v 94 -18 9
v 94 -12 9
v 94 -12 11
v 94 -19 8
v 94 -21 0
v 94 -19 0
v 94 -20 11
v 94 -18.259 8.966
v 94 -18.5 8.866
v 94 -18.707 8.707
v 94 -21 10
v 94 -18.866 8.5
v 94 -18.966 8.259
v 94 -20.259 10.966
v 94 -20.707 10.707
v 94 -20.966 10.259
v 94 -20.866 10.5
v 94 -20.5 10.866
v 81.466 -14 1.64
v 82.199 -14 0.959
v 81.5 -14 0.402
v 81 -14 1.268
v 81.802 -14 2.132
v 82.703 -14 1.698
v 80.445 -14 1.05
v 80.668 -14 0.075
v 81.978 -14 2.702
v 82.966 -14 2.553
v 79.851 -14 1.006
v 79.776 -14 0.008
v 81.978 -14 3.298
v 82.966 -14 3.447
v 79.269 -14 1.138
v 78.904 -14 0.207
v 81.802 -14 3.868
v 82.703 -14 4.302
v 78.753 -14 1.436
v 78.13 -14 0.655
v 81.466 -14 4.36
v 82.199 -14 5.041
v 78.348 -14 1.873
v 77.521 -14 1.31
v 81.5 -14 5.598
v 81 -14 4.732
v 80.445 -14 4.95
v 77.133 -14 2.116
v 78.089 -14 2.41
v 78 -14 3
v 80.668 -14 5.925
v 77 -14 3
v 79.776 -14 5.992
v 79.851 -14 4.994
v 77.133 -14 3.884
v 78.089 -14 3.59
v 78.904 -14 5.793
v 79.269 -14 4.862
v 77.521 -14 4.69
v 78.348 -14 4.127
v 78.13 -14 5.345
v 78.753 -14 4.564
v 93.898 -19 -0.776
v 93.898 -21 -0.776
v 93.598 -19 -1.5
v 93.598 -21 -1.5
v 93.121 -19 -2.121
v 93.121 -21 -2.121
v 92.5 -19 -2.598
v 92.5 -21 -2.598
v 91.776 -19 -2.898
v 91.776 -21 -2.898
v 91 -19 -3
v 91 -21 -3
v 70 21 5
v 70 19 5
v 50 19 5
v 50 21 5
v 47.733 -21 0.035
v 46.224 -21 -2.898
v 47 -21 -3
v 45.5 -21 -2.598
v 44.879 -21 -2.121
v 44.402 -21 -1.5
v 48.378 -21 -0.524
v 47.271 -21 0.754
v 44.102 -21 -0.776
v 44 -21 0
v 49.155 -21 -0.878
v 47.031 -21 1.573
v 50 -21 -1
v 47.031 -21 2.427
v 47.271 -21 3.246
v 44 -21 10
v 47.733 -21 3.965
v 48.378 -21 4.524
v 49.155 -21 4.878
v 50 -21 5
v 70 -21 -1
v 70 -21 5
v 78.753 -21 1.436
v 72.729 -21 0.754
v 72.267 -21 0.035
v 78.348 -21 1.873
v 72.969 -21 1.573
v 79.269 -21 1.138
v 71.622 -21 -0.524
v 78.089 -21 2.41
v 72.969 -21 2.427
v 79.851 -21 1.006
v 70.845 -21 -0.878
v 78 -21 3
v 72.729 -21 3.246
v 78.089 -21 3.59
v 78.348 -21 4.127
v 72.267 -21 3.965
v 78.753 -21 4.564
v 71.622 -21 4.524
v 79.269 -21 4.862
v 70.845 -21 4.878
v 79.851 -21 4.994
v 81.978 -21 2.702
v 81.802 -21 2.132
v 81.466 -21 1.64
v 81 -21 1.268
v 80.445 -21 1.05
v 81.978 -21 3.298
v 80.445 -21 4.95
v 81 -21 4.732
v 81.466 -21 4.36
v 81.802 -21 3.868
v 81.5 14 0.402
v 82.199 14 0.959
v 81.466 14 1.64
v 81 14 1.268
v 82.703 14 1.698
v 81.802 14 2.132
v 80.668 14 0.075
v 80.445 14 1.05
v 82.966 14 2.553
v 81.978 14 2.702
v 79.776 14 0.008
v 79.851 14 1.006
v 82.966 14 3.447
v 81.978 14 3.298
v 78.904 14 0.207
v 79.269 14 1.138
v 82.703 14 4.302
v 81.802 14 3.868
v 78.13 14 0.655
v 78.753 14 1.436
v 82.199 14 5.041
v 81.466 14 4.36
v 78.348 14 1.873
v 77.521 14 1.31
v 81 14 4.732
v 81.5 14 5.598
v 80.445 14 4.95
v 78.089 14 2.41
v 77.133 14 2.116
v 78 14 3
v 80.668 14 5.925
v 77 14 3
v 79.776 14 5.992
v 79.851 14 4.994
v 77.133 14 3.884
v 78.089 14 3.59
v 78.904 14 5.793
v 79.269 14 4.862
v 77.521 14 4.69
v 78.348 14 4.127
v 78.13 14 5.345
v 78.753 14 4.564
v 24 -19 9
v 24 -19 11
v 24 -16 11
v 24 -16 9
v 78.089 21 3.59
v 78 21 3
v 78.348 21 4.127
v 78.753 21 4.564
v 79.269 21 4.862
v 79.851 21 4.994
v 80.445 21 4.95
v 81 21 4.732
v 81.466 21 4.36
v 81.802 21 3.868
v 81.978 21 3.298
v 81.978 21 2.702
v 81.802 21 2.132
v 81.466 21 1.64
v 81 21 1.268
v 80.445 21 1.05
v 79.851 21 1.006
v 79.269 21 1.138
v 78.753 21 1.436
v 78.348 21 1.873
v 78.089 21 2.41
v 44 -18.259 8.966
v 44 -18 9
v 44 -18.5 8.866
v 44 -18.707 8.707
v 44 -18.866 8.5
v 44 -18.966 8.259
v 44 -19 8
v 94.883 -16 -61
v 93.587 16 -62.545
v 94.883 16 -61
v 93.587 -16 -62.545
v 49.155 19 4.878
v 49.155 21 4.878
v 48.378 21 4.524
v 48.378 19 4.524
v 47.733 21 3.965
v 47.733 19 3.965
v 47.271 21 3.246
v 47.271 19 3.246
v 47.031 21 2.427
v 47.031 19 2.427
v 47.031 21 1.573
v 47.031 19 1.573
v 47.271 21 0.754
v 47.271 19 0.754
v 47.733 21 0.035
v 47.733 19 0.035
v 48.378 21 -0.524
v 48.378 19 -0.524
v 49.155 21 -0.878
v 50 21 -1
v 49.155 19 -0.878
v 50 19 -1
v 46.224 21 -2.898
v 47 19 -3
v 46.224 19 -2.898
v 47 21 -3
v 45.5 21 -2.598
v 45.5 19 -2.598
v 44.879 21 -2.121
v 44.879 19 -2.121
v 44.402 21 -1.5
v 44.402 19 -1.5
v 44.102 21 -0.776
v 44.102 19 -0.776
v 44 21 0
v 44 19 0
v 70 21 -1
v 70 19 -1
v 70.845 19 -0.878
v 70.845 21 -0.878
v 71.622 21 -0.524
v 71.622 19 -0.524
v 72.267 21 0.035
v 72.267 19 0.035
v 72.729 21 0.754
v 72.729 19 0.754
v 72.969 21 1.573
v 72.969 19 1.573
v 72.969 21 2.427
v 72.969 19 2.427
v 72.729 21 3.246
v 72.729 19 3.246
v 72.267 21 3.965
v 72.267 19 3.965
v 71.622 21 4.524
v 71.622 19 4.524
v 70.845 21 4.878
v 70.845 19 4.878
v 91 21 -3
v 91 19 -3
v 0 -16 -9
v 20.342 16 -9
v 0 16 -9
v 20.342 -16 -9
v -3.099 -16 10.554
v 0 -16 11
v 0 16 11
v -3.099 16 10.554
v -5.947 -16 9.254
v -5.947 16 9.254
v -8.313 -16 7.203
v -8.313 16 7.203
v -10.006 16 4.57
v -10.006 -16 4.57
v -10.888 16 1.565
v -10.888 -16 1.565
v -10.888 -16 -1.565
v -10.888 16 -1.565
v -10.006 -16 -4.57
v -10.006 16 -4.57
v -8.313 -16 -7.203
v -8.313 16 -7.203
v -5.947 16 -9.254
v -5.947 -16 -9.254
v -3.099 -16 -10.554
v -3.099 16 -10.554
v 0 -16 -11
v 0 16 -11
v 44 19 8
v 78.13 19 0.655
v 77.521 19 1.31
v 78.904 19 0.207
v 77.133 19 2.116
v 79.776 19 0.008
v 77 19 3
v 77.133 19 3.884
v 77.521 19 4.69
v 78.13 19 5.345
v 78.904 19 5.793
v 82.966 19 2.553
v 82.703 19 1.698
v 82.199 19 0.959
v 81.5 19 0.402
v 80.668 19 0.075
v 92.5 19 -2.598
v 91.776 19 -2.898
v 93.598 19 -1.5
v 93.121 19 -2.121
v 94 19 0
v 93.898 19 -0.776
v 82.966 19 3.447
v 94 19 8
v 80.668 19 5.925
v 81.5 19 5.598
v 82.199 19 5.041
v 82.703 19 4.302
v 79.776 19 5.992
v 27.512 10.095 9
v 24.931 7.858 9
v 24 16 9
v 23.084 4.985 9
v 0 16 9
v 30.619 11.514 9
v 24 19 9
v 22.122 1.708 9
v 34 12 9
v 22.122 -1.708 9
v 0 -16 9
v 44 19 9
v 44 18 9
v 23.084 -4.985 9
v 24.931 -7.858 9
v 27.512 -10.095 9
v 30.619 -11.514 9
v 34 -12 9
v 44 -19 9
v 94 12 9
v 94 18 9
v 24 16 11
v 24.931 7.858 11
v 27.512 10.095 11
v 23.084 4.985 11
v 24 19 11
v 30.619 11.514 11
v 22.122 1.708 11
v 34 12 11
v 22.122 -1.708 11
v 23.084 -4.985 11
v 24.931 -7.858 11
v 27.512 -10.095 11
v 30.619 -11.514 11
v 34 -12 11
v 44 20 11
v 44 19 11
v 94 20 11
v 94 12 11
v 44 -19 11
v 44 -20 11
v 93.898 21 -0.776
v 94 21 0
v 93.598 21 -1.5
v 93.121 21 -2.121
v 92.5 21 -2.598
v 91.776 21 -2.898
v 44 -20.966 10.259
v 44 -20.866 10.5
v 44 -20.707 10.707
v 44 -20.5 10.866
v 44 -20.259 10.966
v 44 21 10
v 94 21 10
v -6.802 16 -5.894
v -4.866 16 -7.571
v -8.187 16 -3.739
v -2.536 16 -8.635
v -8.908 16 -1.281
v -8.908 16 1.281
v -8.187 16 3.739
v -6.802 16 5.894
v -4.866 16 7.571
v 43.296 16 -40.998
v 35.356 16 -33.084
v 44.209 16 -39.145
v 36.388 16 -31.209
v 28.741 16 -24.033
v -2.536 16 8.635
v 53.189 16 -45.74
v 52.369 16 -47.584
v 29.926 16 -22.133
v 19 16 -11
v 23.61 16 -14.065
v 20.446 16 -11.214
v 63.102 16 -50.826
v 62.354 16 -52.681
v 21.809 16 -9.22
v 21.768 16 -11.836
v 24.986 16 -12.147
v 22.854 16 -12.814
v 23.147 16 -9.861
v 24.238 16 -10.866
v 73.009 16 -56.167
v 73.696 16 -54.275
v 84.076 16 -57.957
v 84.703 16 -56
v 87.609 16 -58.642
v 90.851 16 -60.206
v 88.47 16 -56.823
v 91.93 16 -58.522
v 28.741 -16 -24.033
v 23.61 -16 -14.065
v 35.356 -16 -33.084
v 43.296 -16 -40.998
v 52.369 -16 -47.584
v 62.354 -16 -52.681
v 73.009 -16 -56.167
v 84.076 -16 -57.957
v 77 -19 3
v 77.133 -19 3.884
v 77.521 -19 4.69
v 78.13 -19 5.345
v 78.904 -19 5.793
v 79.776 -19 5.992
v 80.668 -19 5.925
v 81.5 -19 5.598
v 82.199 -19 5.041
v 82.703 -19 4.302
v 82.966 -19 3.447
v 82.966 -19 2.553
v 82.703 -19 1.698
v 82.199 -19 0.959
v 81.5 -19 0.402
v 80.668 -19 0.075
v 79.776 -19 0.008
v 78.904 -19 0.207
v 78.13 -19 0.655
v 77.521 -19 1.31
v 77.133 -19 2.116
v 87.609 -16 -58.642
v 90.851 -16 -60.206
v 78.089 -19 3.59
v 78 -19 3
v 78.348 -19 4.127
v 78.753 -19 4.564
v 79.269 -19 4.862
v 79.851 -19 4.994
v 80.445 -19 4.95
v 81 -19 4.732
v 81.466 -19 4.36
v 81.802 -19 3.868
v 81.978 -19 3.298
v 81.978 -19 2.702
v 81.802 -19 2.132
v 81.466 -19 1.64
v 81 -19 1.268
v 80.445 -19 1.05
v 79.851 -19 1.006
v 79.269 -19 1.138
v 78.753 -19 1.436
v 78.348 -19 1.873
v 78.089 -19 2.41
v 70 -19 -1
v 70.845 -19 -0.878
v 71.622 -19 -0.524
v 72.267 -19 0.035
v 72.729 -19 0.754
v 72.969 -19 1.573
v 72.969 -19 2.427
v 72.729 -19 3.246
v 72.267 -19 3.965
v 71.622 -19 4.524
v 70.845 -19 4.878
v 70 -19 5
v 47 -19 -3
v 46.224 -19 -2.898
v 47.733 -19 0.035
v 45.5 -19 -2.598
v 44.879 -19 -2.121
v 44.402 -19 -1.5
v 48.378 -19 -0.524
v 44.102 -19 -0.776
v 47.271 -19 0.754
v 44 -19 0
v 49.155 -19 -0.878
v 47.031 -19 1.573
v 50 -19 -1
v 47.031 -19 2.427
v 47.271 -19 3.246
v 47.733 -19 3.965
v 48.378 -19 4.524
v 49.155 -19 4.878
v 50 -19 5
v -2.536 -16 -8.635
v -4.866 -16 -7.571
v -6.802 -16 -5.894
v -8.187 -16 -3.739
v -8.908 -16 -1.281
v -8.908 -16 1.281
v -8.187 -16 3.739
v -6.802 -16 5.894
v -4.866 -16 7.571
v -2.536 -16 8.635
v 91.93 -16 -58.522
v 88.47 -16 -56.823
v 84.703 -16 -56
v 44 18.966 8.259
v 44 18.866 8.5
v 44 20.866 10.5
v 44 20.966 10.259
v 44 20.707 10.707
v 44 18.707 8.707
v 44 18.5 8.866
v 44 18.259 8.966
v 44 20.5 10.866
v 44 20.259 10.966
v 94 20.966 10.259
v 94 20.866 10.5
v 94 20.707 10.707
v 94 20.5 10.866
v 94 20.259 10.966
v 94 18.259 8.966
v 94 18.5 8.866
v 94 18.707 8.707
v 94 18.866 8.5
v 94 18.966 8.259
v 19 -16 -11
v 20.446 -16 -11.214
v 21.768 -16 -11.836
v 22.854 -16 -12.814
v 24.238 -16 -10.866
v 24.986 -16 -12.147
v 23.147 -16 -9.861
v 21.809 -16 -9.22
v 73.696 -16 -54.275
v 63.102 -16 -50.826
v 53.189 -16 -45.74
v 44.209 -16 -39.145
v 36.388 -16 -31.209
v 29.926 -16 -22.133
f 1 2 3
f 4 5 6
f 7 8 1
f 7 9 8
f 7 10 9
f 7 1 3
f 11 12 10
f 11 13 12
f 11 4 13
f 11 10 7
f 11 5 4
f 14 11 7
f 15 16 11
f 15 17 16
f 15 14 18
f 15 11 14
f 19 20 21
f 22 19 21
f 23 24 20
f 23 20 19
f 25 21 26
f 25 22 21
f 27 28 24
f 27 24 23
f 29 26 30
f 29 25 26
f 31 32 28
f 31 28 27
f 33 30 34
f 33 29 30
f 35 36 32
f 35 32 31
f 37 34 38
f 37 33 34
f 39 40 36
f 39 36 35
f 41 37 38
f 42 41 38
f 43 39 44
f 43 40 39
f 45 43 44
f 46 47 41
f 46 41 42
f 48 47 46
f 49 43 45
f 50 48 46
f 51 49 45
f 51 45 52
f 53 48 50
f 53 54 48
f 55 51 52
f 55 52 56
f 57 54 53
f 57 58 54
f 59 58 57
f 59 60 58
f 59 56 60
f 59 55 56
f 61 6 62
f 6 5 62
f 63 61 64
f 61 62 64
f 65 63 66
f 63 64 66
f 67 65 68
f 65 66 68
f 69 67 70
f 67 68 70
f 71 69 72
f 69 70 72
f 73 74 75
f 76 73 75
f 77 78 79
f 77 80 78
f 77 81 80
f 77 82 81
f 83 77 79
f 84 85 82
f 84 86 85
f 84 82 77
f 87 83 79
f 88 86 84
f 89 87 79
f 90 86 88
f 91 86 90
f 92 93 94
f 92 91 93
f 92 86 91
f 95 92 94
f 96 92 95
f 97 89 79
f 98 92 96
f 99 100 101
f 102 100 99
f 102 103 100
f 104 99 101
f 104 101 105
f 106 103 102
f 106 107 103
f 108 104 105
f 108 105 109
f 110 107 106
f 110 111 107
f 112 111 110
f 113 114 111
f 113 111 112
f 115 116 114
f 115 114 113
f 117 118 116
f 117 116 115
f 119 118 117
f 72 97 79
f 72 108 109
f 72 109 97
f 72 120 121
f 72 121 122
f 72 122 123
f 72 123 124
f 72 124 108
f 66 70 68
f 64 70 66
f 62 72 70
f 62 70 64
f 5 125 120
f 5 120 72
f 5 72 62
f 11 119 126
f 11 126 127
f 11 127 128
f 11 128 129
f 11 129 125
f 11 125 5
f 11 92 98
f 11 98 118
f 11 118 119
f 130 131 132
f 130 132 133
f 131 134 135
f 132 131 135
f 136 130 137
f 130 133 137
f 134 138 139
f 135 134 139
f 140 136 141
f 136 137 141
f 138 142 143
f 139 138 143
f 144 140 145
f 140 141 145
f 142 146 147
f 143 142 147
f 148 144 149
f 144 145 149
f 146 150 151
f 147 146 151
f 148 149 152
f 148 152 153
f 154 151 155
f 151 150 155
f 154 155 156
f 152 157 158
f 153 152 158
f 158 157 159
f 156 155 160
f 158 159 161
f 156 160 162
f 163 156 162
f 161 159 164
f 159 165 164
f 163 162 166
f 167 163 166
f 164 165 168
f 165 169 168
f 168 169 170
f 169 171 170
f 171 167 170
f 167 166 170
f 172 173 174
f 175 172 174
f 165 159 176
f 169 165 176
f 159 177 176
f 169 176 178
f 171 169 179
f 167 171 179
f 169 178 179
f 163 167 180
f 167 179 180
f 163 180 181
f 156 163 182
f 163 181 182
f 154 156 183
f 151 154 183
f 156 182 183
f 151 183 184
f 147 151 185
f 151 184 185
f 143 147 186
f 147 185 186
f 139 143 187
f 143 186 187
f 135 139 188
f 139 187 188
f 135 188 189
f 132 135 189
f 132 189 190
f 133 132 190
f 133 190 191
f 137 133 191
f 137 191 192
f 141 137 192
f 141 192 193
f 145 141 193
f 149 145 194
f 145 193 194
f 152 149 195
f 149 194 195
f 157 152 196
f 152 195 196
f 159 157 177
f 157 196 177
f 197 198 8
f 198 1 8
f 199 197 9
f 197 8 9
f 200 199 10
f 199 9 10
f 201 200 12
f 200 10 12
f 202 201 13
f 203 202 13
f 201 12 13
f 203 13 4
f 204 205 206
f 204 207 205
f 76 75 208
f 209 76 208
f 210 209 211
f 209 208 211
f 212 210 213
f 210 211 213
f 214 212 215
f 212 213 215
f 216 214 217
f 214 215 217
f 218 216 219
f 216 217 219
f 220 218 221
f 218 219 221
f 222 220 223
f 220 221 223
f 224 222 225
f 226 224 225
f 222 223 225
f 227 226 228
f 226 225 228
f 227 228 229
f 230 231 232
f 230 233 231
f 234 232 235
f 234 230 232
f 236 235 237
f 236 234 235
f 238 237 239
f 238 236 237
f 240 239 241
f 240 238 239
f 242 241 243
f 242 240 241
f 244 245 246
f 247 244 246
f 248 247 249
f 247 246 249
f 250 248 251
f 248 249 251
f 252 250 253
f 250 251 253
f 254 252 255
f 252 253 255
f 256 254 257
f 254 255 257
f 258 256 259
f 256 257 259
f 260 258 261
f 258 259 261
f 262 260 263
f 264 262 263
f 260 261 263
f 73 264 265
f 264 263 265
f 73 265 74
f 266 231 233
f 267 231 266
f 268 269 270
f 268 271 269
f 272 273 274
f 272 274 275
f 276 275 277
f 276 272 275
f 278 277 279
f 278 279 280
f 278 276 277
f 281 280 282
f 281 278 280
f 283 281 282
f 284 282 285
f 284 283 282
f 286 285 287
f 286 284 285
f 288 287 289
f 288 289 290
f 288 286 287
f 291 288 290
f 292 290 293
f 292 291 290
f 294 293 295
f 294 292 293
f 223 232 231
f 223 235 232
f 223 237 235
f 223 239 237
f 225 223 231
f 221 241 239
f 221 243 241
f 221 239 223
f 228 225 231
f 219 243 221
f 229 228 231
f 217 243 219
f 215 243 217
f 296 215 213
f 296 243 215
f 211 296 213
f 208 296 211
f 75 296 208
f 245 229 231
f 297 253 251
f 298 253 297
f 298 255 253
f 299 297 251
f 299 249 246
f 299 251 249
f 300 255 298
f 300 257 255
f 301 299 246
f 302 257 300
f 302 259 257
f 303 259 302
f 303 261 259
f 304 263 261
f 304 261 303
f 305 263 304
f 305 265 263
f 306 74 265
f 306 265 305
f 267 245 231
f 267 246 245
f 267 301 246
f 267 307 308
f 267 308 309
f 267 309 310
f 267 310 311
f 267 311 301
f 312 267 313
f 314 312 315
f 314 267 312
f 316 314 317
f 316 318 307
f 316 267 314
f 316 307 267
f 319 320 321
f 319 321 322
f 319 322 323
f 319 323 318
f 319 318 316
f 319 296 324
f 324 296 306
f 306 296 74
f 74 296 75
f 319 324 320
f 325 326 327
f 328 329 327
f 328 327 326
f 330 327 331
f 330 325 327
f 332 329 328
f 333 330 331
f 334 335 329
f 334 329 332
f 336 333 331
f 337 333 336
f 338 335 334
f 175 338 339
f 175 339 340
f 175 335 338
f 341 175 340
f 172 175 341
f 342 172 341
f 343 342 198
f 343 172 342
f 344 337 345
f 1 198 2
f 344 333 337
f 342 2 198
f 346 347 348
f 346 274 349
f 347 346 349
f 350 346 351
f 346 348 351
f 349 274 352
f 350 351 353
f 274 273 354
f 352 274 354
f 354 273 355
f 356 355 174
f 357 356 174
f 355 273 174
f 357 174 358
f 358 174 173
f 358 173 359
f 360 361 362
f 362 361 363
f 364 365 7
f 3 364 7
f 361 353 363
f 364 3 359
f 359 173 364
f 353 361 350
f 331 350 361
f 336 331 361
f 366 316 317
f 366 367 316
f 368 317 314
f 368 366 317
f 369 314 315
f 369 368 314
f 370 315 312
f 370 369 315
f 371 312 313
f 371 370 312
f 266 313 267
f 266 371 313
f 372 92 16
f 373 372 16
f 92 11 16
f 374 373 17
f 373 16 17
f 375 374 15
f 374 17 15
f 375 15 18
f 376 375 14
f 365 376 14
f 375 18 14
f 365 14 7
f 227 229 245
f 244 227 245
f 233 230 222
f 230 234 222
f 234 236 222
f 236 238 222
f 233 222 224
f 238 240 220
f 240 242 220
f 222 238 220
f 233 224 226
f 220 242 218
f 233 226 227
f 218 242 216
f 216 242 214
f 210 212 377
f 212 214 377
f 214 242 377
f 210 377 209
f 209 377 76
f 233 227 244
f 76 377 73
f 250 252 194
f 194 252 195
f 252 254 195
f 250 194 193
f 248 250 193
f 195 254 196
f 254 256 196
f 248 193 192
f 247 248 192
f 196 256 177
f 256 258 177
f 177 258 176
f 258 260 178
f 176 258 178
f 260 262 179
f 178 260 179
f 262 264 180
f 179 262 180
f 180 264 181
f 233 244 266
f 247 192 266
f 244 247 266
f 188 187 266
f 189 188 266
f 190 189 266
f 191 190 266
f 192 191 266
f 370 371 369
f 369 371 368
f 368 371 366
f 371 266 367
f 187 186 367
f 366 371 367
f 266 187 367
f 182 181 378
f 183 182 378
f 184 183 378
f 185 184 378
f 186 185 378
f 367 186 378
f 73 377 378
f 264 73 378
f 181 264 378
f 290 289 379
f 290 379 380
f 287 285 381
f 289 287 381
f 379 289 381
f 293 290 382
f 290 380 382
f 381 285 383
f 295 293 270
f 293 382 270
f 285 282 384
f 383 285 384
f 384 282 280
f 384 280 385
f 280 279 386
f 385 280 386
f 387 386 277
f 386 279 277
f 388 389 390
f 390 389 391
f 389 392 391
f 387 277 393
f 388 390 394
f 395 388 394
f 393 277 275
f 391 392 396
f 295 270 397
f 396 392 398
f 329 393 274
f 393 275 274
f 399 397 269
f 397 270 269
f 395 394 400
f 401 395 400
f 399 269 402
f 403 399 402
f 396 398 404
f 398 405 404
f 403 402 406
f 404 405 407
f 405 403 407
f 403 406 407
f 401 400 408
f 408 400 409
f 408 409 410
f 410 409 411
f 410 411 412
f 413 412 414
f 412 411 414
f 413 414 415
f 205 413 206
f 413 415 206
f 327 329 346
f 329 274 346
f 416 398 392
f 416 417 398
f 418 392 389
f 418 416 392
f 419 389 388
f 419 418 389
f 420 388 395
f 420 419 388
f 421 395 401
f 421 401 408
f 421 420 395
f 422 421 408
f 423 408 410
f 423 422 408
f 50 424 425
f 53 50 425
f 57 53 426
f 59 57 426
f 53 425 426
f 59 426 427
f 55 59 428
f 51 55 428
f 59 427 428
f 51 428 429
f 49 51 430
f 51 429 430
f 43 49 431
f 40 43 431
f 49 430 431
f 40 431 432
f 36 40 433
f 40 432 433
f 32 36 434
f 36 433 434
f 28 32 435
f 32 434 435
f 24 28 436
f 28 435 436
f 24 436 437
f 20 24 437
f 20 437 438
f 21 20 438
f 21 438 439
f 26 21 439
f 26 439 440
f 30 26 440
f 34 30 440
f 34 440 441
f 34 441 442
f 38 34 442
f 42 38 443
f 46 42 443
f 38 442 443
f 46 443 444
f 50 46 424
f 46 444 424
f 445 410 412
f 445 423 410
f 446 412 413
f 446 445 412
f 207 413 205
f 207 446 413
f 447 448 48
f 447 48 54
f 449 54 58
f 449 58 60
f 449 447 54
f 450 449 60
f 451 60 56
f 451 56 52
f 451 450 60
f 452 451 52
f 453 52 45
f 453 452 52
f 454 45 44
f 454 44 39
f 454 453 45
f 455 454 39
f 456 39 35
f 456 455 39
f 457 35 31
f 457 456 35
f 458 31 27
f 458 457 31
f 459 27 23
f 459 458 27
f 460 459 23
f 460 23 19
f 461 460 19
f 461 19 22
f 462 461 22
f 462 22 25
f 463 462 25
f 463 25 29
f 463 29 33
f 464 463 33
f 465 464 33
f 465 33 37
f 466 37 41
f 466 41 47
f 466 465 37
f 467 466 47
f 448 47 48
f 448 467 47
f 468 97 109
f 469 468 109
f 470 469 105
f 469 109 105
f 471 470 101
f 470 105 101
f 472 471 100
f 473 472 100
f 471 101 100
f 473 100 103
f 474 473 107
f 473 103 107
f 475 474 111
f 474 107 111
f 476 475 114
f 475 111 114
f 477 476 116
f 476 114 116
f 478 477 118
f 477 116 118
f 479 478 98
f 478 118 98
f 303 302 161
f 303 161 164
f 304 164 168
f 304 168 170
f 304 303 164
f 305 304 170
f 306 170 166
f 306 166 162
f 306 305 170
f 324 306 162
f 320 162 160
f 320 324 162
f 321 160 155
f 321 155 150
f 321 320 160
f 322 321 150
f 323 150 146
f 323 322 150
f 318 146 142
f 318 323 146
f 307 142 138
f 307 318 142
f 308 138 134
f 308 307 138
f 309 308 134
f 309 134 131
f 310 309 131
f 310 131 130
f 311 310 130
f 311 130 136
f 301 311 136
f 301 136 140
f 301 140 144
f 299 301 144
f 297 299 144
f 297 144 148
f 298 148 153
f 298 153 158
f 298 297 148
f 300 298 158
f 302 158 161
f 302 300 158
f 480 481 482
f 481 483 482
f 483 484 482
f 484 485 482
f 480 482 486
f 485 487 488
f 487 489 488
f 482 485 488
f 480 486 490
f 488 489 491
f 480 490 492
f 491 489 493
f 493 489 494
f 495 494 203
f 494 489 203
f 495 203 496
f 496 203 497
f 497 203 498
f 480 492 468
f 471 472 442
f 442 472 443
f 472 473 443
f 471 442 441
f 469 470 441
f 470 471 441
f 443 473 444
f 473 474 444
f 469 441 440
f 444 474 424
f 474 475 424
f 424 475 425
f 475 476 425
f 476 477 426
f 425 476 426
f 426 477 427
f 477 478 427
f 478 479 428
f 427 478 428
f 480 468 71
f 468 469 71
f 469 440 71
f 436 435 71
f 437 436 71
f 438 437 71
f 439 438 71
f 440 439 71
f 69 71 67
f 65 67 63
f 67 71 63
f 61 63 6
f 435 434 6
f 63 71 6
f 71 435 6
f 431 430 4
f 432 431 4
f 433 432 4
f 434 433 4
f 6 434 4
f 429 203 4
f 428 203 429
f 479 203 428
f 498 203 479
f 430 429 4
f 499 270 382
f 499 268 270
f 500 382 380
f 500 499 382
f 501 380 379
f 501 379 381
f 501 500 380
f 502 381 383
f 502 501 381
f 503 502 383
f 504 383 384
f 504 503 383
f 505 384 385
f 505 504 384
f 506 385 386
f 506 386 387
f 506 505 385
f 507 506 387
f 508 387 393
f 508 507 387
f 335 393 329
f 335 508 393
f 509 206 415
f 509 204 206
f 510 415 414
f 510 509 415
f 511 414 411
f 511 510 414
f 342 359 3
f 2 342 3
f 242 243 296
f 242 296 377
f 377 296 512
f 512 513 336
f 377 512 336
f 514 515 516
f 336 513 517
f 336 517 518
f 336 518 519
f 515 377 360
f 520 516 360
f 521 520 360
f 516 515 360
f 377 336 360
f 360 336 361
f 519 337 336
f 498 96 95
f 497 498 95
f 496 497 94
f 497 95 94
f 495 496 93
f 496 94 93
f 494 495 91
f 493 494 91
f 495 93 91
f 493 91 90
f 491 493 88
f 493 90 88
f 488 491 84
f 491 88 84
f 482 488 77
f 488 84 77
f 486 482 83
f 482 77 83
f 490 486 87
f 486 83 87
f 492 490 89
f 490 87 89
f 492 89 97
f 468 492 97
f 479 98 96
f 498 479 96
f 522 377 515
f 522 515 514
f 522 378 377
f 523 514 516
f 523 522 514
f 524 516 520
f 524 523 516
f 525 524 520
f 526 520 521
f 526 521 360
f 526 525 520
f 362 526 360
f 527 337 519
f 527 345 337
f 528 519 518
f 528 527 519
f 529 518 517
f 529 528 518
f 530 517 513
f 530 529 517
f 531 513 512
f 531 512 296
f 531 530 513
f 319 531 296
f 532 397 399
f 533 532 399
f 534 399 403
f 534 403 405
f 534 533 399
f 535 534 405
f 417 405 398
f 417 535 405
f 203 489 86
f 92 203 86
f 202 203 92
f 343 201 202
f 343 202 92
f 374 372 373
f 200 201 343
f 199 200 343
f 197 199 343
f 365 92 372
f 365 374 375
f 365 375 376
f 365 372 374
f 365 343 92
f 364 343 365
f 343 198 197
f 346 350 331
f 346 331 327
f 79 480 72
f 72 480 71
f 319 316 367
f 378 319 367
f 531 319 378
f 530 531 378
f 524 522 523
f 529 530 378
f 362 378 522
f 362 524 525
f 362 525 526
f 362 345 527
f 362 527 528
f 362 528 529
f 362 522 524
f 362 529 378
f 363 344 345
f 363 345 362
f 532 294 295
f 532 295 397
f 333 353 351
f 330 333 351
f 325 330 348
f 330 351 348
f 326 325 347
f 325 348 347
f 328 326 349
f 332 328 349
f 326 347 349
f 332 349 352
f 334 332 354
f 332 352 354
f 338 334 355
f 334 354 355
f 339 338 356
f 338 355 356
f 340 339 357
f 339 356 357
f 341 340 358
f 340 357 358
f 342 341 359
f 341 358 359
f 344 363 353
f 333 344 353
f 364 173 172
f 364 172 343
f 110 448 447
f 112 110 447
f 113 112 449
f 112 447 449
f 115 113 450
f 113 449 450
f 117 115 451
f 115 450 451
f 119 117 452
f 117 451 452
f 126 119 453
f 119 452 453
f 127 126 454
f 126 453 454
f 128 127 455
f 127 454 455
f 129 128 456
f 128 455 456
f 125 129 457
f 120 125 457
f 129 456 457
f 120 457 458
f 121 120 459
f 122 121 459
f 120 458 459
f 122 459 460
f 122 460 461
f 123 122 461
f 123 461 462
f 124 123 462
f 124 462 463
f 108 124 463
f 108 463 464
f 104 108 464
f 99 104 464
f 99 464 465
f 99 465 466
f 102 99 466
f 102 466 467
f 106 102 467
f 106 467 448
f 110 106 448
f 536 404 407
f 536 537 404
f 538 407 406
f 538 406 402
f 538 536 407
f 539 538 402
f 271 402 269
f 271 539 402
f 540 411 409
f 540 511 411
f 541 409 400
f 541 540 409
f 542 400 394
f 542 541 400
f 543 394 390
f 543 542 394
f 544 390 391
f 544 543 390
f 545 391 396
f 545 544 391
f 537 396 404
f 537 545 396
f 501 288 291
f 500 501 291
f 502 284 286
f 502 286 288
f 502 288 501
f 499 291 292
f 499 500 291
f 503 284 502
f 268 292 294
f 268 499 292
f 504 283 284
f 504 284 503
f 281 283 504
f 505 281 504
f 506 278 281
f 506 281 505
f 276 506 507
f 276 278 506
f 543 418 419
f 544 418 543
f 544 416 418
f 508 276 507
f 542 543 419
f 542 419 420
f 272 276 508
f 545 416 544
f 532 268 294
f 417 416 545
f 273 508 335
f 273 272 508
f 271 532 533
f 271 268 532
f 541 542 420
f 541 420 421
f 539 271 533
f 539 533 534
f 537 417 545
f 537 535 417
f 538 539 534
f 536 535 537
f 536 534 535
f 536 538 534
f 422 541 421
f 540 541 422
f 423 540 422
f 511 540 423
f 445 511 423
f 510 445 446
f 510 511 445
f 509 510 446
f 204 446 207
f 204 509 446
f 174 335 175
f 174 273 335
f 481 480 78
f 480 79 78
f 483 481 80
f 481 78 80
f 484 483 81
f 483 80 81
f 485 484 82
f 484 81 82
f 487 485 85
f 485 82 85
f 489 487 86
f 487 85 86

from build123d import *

# Parameters (mm, degrees)
F1_DEPTH  = 16
F2_W      = 70
F2_H      = 3
F3_DEPTH  = 2
F4_W      = 50
F4_H      = 14
F5_DEPTH  = 2
F6_R      = 1
F9_DEPTH  = 2
F11_DEPTH = 42.001
F13_D     = 4
F14_R     = 3
F14_R_2   = 2
F15_DEPTH = 5
F16_R     = 3


# Not quite as in the source:
# - a pattern or mirror of a feature is missing from the dataset's text; its kind, count and spacing are read off the source's solid


with BuildPart() as f1:
    # F0 (on Front) → F1 (new body)
    with BuildSketch(Plane.XZ):
        with BuildLine():
            ThreePointArc((0, -9), (-9, 0), (0, 9))
            Line((0, 9), (94, 9))
            Line((94, 9), (94, 11))
            Line((94, 11), (0, 11))
            ThreePointArc((0, 11), (-11, 0), (0, -11))
            Line((0, -11), (19, -11))
            ThreePointArc((19, -11), (21.7681124643, -11.8361612201), (23.6103896104, -14.064978646))
            ThreePointArc((23.6103896104, -14.064978646), (47.704208574, -44.4678662727), (84.0759449666, -57.9565459739))
            ThreePointArc((84.0759449666, -57.9565459739), (89.2804195373, -59.3196982134), (93.5865207758, -62.5449473062))
            Line((93.5865207758, -62.5449473062), (94.8828854905, -61))
            ThreePointArc((94.8828854905, -61), (90.2510294077, -57.5678191663), (84.7034264019, -56))
            ThreePointArc((84.7034264019, -56), (48.5673164119, -42.6217020739), (24.9861322889, -12.1467114099))
            ThreePointArc((24.9861322889, -12.1467114099), (23.1470623984, -9.8607704249), (20.3422845953, -9))
            Line((20.3422845953, -9), (0, -9))
        make_face()
    extrude(amount=F1_DEPTH)

    # F2 (on face) → F3 (join)
    with BuildSketch(Plane.XY.offset(11)):
        with Locations((59, -17.5)):
            Rectangle(F2_W, F2_H)
    extrude(amount=-F3_DEPTH)

    # F4 (on face) → F5 (join)
    with BuildSketch(Plane.XZ.offset(19)):
        with Locations((69, 4)):
            Rectangle(F4_W, F4_H)
    extrude(amount=F5_DEPTH)

    # F6
    f6_edges = [f1.edges().sort_by_distance(p)[0] for p in [
        (69, -21, 11),
        (69, -19, 9),
    ]]
    fillet(f6_edges, radius=F6_R)

    # F7: F1 across plane


with BuildPart() as f1_1:
    add(f1.part)
    add(f1.part.mirror(Plane.XZ))

    # F8 (on face) → F9 (cut)
    with BuildSketch(Plane.XY.offset(11)):
        with BuildLine():
            Line((94, 12), (34, 12))
            ThreePointArc((34, 12), (22, 0), (34, -12))
            Line((34, -12), (94, -12))
            Line((94, -12), (94, 12))
        make_face()
    extrude(amount=-F9_DEPTH, mode=Mode.SUBTRACT)

    # F10 (on face) → F11 (cut, through all)
    with BuildSketch(Plane.XZ.offset(21)):
        with BuildLine():
            ThreePointArc((50, 5), (47, 2), (50, -1))
            Line((50, -1), (70, -1))
            ThreePointArc((70, -1), (73, 2), (70, 5))
            Line((70, 5), (50, 5))
        make_face()
    extrude(amount=-F11_DEPTH, mode=Mode.SUBTRACT)

    # F13 (through all)
    with Locations(Plane.XZ.offset(21)):
        with Locations((80, 3)):
            Hole(F13_D / 2)

    # F14 (on face) → F15 (join)
    with BuildSketch(Plane(origin=(0, -19, 0), x_dir=(-1, 0, 0), z_dir=(0, 1, 0))):
        with Locations((-80, 3)):
            Circle(F14_R)
        with Locations((-80, 3)):
            Circle(F14_R_2, mode=Mode.SUBTRACT)
    f15 = extrude(amount=F15_DEPTH)

    # F15_copies: F15 across plane
    add(f15.mirror(Plane.ZX))

    # F16
    f16_edges = [f1_1.edges().sort_by_distance(p)[0] for p in [
        (94, 20, -3),
        (44, 20, -3),
        (44, -20, -3),
        (94, -20, -3),
    ]]
    fillet(f16_edges, radius=F16_R)


solid = f1_1.part
